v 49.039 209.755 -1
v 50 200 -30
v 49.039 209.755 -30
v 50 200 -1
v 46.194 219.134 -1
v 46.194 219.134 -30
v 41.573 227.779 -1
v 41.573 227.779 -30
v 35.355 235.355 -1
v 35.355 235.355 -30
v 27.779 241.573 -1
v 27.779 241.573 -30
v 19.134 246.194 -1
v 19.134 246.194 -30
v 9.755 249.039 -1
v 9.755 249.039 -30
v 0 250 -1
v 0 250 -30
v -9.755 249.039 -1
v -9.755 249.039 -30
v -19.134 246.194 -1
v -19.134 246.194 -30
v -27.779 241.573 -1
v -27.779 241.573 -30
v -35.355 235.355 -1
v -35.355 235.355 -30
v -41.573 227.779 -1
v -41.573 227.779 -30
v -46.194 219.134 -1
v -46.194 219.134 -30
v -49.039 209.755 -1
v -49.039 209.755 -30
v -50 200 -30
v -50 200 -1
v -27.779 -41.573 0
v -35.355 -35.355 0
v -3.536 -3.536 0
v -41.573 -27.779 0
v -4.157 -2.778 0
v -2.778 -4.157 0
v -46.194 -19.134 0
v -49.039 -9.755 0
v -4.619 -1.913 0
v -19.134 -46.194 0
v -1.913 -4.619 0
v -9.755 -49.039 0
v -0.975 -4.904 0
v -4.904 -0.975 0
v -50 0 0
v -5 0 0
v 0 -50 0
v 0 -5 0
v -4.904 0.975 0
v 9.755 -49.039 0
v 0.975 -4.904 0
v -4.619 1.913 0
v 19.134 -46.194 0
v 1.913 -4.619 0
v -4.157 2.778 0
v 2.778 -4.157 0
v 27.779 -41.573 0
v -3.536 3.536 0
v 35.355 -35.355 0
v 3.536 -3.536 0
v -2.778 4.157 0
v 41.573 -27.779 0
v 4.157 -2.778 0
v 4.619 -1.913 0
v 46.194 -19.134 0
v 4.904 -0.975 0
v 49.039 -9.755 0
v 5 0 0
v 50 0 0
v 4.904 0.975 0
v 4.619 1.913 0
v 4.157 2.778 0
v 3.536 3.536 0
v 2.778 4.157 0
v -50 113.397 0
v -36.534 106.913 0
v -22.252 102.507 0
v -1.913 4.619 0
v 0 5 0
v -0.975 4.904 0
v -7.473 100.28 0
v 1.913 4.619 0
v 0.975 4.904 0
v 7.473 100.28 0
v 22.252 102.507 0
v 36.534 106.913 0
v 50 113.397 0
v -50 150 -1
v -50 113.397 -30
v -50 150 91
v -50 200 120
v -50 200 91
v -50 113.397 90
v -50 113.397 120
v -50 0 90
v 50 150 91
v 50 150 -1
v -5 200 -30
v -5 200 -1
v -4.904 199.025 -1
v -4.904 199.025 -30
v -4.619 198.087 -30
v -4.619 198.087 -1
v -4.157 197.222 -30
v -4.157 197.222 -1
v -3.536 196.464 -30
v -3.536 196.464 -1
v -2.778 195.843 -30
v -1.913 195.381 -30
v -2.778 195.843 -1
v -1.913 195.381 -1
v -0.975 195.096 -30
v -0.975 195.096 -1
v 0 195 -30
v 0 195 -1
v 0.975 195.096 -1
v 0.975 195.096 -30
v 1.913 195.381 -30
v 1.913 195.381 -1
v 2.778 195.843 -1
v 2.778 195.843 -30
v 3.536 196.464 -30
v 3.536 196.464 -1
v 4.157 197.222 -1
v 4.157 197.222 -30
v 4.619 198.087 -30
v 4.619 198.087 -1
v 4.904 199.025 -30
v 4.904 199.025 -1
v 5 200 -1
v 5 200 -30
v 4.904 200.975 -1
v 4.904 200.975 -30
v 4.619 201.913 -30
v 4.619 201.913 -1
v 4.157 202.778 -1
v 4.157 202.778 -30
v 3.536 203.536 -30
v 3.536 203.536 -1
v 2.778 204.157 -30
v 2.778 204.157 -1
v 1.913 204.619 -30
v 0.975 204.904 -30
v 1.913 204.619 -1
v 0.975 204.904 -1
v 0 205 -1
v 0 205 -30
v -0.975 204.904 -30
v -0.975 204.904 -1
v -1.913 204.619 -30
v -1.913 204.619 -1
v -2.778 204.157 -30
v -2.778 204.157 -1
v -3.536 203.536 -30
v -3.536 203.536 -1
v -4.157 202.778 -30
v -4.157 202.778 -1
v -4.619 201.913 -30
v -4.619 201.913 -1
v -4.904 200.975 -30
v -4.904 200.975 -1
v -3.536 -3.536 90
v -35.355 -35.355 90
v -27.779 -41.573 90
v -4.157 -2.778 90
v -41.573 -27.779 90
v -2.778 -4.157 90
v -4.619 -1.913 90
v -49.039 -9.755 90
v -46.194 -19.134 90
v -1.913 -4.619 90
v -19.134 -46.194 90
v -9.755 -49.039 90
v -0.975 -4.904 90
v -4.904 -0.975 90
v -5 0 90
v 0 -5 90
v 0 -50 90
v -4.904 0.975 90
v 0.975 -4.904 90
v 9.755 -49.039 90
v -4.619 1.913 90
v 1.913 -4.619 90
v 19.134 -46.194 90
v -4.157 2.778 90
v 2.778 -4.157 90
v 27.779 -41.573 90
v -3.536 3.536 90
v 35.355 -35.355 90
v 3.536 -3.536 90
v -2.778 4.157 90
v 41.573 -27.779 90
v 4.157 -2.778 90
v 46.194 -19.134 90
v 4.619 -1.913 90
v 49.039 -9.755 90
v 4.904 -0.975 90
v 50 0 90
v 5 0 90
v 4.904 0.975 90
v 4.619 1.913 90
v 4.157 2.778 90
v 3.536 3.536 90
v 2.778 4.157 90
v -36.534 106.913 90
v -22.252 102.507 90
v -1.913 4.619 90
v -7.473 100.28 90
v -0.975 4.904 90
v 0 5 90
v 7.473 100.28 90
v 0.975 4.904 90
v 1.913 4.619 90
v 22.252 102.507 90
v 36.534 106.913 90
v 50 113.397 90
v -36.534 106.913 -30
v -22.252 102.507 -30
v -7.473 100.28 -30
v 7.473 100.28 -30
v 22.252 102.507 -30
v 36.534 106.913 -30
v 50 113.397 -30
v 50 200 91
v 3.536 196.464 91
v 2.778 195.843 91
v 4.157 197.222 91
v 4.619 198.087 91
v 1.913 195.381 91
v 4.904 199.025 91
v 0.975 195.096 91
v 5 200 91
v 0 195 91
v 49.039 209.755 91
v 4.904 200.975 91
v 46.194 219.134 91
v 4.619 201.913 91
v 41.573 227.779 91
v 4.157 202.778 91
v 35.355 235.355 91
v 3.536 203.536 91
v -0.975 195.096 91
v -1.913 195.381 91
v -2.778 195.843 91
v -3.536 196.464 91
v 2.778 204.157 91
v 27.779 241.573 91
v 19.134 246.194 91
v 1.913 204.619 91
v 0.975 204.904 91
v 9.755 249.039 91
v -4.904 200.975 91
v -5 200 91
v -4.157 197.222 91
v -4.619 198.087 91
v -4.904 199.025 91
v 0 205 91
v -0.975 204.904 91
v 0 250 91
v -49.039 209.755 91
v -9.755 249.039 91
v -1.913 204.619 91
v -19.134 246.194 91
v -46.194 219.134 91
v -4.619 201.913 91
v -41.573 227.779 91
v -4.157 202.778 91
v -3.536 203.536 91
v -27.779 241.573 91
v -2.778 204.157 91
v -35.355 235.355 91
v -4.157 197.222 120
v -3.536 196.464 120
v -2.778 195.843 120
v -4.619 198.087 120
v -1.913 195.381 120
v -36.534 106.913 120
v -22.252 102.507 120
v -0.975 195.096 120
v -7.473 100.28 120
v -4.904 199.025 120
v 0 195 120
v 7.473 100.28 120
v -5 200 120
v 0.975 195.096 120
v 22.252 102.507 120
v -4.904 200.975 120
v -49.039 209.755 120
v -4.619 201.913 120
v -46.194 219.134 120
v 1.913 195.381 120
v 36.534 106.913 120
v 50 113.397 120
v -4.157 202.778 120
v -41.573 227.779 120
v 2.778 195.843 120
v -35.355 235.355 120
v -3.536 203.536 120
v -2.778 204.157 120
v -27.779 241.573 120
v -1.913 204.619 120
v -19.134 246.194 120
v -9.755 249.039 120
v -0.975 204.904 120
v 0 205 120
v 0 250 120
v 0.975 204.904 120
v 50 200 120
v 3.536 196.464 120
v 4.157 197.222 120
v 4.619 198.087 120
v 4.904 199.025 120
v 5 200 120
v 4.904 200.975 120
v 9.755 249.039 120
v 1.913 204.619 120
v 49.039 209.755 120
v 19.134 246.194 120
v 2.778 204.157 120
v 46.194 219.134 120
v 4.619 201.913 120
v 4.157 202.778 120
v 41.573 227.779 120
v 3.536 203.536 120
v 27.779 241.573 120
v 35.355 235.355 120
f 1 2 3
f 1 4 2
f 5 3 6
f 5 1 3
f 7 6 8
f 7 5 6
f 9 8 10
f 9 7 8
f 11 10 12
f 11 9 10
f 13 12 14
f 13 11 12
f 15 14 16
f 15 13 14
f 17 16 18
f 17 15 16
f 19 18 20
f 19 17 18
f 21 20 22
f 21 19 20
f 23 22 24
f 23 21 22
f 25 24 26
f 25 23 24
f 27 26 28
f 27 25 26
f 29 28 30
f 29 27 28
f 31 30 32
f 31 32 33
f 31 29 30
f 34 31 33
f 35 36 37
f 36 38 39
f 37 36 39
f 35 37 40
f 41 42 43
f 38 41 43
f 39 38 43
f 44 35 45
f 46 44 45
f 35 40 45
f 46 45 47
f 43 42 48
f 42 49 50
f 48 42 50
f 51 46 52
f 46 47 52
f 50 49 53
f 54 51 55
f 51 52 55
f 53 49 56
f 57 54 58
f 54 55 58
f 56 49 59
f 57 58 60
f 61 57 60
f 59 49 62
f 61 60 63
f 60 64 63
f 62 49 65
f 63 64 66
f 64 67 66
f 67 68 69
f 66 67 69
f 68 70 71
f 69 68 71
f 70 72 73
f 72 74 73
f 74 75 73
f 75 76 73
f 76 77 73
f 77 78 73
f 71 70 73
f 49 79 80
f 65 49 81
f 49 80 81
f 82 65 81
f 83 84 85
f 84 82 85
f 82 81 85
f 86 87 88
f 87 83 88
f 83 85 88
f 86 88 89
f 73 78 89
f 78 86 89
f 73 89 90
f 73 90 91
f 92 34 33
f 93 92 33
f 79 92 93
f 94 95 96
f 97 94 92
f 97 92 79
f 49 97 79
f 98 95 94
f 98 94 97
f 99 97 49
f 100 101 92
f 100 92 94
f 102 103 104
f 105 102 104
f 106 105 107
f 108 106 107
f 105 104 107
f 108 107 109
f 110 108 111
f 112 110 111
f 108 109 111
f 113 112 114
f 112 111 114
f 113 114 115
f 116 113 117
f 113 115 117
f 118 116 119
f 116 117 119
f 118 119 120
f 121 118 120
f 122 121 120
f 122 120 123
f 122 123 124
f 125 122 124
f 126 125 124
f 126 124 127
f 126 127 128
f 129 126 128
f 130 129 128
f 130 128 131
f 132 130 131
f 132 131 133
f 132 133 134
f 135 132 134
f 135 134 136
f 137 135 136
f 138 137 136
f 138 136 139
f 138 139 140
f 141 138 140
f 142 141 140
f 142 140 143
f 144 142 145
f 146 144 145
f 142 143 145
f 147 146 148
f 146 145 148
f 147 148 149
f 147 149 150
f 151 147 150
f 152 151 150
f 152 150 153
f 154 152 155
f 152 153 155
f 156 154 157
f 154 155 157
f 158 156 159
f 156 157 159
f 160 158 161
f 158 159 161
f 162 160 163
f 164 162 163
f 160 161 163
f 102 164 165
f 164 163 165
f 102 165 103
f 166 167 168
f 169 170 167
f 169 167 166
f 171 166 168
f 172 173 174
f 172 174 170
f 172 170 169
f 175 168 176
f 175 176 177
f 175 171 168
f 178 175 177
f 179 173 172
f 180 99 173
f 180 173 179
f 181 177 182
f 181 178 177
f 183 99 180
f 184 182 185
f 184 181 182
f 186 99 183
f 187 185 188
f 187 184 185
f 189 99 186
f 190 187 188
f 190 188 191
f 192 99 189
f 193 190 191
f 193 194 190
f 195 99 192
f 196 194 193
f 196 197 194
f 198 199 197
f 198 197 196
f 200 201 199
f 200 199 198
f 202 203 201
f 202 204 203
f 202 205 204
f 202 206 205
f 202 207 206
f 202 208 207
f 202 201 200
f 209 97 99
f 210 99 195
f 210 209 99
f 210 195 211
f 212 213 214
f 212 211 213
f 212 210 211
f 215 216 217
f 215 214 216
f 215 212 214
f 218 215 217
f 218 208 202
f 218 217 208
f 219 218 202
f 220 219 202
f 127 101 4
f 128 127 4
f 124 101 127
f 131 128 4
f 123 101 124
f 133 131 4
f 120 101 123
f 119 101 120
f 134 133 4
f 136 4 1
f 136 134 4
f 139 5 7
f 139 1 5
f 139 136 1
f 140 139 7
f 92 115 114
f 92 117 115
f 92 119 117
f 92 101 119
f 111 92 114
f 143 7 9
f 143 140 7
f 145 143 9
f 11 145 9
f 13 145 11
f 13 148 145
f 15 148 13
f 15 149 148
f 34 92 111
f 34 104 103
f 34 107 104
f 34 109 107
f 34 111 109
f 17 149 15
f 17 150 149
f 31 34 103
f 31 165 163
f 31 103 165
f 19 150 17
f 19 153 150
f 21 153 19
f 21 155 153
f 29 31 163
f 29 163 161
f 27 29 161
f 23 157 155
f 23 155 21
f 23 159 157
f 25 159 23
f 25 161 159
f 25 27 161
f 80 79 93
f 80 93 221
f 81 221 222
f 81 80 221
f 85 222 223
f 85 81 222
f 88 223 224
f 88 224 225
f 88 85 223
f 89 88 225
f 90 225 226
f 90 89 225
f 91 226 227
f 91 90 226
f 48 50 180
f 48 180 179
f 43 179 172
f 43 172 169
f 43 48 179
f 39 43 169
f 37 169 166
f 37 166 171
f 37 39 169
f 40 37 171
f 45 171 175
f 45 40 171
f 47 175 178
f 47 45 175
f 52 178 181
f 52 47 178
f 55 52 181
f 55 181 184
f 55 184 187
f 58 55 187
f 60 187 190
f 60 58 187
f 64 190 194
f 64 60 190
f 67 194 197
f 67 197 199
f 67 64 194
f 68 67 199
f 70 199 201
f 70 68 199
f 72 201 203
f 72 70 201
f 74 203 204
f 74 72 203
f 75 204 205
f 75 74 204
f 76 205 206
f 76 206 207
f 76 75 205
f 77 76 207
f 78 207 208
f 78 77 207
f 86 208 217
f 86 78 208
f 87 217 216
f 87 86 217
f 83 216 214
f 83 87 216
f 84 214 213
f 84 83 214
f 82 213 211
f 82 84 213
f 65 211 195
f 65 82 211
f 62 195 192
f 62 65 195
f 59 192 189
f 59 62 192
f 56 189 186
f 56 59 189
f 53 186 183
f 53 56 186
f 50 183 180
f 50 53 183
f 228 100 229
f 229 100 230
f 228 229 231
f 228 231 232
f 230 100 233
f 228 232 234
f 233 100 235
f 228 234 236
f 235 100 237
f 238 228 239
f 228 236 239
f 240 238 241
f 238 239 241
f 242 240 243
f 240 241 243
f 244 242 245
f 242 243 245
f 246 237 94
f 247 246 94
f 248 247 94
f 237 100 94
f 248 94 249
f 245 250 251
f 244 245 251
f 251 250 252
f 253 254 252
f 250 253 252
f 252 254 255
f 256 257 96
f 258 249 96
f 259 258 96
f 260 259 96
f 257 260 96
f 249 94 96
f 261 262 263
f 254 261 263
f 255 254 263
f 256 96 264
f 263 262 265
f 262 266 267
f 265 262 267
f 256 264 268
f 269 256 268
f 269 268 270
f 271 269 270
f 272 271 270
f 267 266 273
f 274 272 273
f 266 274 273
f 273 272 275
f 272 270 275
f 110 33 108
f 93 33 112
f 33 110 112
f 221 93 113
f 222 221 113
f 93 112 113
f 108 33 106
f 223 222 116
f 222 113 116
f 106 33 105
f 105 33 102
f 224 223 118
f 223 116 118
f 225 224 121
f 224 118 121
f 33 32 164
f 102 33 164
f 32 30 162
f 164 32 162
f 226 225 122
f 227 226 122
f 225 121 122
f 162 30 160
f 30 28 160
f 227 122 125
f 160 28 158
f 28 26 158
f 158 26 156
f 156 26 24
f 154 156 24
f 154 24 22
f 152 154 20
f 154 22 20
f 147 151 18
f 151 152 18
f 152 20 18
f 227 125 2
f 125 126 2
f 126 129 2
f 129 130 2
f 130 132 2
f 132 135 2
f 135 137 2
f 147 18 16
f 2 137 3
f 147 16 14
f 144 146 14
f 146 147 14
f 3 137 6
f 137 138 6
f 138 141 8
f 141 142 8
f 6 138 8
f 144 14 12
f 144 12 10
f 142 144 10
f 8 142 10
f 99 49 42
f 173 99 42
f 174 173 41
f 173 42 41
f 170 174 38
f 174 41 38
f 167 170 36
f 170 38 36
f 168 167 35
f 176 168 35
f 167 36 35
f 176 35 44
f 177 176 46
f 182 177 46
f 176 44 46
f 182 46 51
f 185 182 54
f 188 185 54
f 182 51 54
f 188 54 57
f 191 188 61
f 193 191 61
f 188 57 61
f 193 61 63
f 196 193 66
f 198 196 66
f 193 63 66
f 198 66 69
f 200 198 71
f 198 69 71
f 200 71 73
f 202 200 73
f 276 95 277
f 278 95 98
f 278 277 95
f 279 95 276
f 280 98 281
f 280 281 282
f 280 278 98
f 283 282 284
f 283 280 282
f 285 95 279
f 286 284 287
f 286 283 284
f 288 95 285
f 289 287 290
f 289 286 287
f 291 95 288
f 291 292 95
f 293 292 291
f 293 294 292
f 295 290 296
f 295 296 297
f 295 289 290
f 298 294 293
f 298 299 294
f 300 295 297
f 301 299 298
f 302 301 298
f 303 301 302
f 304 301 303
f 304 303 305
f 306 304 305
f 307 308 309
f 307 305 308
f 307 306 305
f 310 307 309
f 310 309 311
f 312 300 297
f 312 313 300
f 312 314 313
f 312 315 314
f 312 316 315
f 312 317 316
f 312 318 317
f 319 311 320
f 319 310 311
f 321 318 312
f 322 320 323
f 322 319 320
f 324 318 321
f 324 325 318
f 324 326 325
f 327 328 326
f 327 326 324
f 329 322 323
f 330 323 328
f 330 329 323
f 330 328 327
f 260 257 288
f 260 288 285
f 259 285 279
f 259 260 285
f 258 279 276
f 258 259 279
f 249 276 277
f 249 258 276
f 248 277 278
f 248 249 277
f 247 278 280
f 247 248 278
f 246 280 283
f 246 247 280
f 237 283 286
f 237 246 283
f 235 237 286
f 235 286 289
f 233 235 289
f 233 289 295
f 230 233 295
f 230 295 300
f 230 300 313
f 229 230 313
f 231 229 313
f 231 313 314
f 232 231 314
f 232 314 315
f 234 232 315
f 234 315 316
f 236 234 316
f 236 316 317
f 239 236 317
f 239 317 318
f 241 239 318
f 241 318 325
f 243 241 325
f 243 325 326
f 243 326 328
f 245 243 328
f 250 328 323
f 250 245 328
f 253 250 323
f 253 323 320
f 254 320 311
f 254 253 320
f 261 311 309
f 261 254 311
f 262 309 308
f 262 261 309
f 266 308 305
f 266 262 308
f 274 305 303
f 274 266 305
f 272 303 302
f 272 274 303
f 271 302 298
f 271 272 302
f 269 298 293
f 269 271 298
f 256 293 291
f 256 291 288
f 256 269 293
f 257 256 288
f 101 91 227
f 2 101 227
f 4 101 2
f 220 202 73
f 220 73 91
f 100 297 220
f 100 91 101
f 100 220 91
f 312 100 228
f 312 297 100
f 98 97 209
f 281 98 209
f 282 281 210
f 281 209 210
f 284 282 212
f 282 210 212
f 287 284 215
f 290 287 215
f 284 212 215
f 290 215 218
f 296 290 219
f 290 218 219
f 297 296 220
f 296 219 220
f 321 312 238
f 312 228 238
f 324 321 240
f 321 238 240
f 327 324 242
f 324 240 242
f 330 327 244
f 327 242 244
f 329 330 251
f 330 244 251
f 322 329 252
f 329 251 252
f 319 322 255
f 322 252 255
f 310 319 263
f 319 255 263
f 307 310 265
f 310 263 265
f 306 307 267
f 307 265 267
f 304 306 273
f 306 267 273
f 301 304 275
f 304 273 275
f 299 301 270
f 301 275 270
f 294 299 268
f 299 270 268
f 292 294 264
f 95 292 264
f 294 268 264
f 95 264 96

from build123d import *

# Parameters (mm, degrees)
SKIZZE1_R                       = 5
AUFSATZ_LINEAR_AUSTRAGEN1_DEPTH = 90
SKIZZE2_R                       = 5
AUFSATZ_LINEAR_AUSTRAGEN2_DEPTH = 30
SKIZZE3_W                       = 92
SKIZZE3_H                       = 100
SCHNITT_LINEAR_AUSTRAGEN1_DEPTH = 295.78805946


with BuildPart() as part:
    # Skizze1 → Aufsatz-Linear austragen1 (new body)
    with BuildSketch(Plane.XY):
        with BuildLine():
            Line((50, 0), (50, 200))
            ThreePointArc((50, 200), (0, 250), (-50, 200))
            Line((-50, 200), (-50, 0))
            ThreePointArc((-50, 0), (0, -50), (50, 0))
        make_face()
        with Locations(Location((0, 200, 0), (0, 0, 180))):
            Circle(SKIZZE1_R, mode=Mode.SUBTRACT)
        with Locations(Location((0, 0, 0), (0, 0, 180))):
            Circle(SKIZZE1_R, mode=Mode.SUBTRACT)
    extrude(amount=AUFSATZ_LINEAR_AUSTRAGEN1_DEPTH)

    # Skizze2 → Aufsatz-Linear austragen2 (add)
    # profile 1 of 2: a face of its own
    with BuildSketch(Plane.XY.offset(90)):
        with BuildLine():
            ThreePointArc((50, 200), (0, 250), (-50, 200))
            ThreePointArc((-50, 200), (0, 150), (50, 200))
        make_face()
        with Locations(Location((0, 200, 0), (0, 0, 180))):
            Circle(SKIZZE2_R, mode=Mode.SUBTRACT)
    # profile 2 of 2: a face of its own
    with BuildSketch(Plane.XY.offset(90)):
        with BuildLine():
            ThreePointArc((50, 200), (0, 150), (-50, 200))
            Line((-50, 200), (-50, 113.397459622))
            ThreePointArc((-50, 113.397459622), (0, 100), (50, 113.397459622))
            Line((50, 113.397459622), (50, 200))
        make_face()
    aufsatz_linear_austragen2 = extrude(amount=AUFSATZ_LINEAR_AUSTRAGEN2_DEPTH)

    # Spiegeln1: Aufsatz-Linear austragen2 across plane
    add(aufsatz_linear_austragen2.mirror(Plane(origin=(0, 0, 45), x_dir=(1, 0, 0), z_dir=(0, 0, -1))))

    # Skizze3 → Schnitt-Linear austragen1 (cut, through all)
    with BuildSketch(Plane.ZY.offset(50)):
        with Locations((45, 200)):
            Rectangle(SKIZZE3_W, SKIZZE3_H)
    extrude(amount=-SCHNITT_LINEAR_AUSTRAGEN1_DEPTH, mode=Mode.SUBTRACT)


solid = part.part
